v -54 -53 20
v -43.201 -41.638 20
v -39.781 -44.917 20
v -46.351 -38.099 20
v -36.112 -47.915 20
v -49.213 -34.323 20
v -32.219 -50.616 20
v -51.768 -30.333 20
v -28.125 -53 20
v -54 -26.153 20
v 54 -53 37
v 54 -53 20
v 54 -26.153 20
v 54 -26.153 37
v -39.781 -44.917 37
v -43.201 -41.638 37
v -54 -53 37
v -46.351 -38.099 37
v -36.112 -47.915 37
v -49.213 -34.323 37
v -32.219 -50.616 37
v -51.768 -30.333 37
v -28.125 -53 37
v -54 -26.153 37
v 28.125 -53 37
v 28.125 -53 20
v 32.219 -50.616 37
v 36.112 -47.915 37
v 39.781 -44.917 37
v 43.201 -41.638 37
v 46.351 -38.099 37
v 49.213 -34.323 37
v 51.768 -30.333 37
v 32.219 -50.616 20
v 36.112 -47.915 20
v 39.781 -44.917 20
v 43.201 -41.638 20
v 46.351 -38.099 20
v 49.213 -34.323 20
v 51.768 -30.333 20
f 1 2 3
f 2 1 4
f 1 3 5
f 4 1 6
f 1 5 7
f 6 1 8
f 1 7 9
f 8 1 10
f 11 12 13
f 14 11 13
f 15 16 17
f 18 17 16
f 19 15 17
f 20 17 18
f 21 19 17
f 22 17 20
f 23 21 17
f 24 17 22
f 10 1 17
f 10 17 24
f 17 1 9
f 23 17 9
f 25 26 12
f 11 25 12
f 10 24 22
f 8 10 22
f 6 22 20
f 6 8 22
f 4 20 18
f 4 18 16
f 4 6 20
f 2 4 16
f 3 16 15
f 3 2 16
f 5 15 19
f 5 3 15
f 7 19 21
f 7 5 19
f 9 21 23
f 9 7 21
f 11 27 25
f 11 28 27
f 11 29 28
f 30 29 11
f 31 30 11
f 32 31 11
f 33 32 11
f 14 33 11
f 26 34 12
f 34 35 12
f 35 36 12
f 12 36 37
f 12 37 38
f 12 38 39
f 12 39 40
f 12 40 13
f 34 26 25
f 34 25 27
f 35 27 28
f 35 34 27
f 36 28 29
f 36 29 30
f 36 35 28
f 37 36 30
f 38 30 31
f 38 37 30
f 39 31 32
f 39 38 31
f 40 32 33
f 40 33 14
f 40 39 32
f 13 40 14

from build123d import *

# Parameters (mm, degrees)
CYLINDER122_R               = 1.5
CYLINDER122_DEPTH           = 4
CYLINDER124_R               = 1.5
CYLINDER124_DEPTH           = 100
BOX039_W                    = 2
BOX039_H                    = 6
BOX039_DEPTH                = 6
COMPOUND158_PLACEMENT_ANGLE = 90
CYLINDER123_R               = 1.5
CYLINDER123_DEPTH           = 4
CYLINDER126_R               = 1.5
CYLINDER126_DEPTH           = 100
BOX038_W                    = 2
BOX038_H                    = 6
BOX038_DEPTH                = 6
COMPOUND159_PLACEMENT_ANGLE = 90
CYLINDER125_R               = 60
CYLINDER125_DEPTH           = 17
BOX040_W                    = 108
BOX040_H                    = 46
BOX040_DEPTH                = 17


with BuildPart() as v_lec122:
    # Cylinder122 → Cylinder122 (new body)
    with BuildSketch(Plane(origin=(-4, 3, 3), x_dir=(0, 0, -1), z_dir=(1, 0, 0))):
        Circle(CYLINDER122_R)
    extrude(amount=CYLINDER122_DEPTH)


with BuildPart() as v_lec124:
    # Cylinder124 → Cylinder124 (new body)
    with BuildSketch(Plane(origin=(2, 3, 3), x_dir=(0, 0, -1), z_dir=(1, 0, 0))):
        Circle(CYLINDER124_R)
    extrude(amount=CYLINDER124_DEPTH)


with BuildPart() as compound158:
    # Box039 → Box039 (new body)
    with BuildSketch(Plane.XY):
        with Locations((1, 3)):
            Rectangle(BOX039_W, BOX039_H)
    extrude(amount=BOX039_DEPTH)

    # Compound158: union Válec122, Válec124
    add(v_lec122.part)
    add(v_lec124.part)


with BuildPart() as compound158_1:
    # Compound158 placement: moved
    add(compound158.part.moved(Location((-54, 166, 27))).rotate(Axis((-54, 166, 27), (0, 0, -1)), COMPOUND158_PLACEMENT_ANGLE))


with BuildPart() as v_lec123:
    # Cylinder123 → Cylinder123 (new body)
    with BuildSketch(Plane(origin=(-4, 3, 3), x_dir=(0, 0, -1), z_dir=(1, 0, 0))):
        Circle(CYLINDER123_R)
    extrude(amount=CYLINDER123_DEPTH)


with BuildPart() as v_lec126:
    # Cylinder126 → Cylinder126 (new body)
    with BuildSketch(Plane(origin=(2, 3, 3), x_dir=(0, 0, -1), z_dir=(1, 0, 0))):
        Circle(CYLINDER126_R)
    extrude(amount=CYLINDER126_DEPTH)


with BuildPart() as fusion004:
    # Box038 → Box038 (new body)
    with BuildSketch(Plane.XY):
        with Locations((1, 3)):
            Rectangle(BOX038_W, BOX038_H)
    extrude(amount=BOX038_DEPTH)

    # Compound159: union Válec123, Válec126
    add(v_lec123.part)
    add(v_lec126.part)


with BuildPart() as fusion004_1:
    # Compound159 placement: moved
    add(fusion004.part.moved(Location((48, 166, 27))).rotate(Axis((48, 166, 27), (0, 0, -1)), COMPOUND159_PLACEMENT_ANGLE))

    # Fusion004: union Compound158
    add(compound158_1.part)


with BuildPart() as v_lec125:
    # Cylinder125 → Cylinder125 (new body)
    with BuildSketch(Plane.XY.offset(20)):
        Circle(CYLINDER125_R)
    extrude(amount=CYLINDER125_DEPTH)


with BuildPart() as cut059:
    # Box040 → Box040 (new body)
    with BuildSketch(Plane(origin=(-54, -53, 20), x_dir=(1, 0, 0), z_dir=(0, 0, 1))):
        with Locations((54, 23)):
            Rectangle(BOX040_W, BOX040_H)
    extrude(amount=BOX040_DEPTH)

    # Cut058: cut Válec125
    add(v_lec125.part, mode=Mode.SUBTRACT)

    # Cut059: cut Fusion004
    add(fusion004_1.part, mode=Mode.SUBTRACT)


solid = cut059.part
